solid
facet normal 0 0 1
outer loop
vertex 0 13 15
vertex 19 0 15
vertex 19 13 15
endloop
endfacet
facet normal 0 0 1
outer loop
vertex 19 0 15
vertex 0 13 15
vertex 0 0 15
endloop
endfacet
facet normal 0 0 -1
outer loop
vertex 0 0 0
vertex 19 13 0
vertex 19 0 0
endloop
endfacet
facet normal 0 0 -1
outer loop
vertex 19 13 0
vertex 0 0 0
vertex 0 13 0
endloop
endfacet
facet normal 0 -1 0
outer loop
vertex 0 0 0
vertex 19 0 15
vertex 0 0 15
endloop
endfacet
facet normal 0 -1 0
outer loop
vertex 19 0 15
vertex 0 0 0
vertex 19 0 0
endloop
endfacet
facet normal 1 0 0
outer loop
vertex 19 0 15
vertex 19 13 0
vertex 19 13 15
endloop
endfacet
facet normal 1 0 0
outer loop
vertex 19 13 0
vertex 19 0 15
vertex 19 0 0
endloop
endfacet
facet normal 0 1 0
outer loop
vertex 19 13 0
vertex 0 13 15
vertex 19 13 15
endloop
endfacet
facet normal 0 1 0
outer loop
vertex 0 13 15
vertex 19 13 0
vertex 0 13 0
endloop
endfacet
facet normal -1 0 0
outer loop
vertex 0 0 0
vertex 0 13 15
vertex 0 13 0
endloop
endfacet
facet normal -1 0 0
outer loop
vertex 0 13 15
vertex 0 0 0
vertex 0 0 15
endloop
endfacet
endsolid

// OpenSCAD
// Generated by SolidPython 1.0.1 on 2020-07-29 00:46:56


cube(size = [19, 13, 15]);
/***********************************************
*********      SolidPython code:      **********
************************************************
 
# import packages: SolidPython
from solid import *
from solid.utils import *
from itertools import chain, combinations, permutations


class Resize:

    def __init__(self, scad_file):
        self.scad_file = scad_file
        #self.scad_file = import_scad(scad_file)
        # cone/cylinder param:
        self.r1 = 0
        self.r2 = 0
        self.h = 0
        # rectangular prism param:
        self.w = 0
        self.l = 0
        # ellipse param:
        self.r = 0

    # import OpenScad code (file name corresponds to shape)


    # classify shape + parameters
    def assign(self, param1, param2, param3):
        if self.scad_file == 'cone.scad':
            self.r1 = param1
            self.r2 = param2
            self.h = param3
        elif self.scad_file == 'cylinder.scad':
            self.r1 = param1
            self.r2 = param2
            self.h = param3
        elif self.scad_file == 'rectangularPrism.scad':
            self.h = param1
            self.l = param2
            self.w = param3
        else:
            self.r = param1
            self.h = param2

    # resize parameters
    def iterate(self):
        x = range(3, 20, 2)
        i = 1
        if self.scad_file == 'cone.scad':
            tempList = list(permutations(x, 2))
            for temp in tempList:
                param1 = temp[0]
                param2 = temp[1]
                filepath = 'produced_scad_files/' + 'cone' + str(param1) + '_' + str(param2) + '_' + '.scad'
                scad_render_to_file(cylinder(h=param1, r1=param2, r2=0), filepath)

        elif self.scad_file == 'cylinder.scad':
            tempList = list(permutations(x, 3))
            for temp in tempList:
                param1 = temp[0]
                param2 = temp[1]
                filepath = 'produced_scad_files/' + 'cylinder' + str(param1) + '_' + str(param2) + '_' + '.scad'
                scad_render_to_file(cylinder(h=param1, r1=param2, r2=param2), filepath)

        elif self.scad_file == 'rectangularPrism.scad':
            tempList = list(permutations(x, 3))
            for temp in tempList:
                param1 = temp[0]
                param2 = temp[1]
                param3 = temp[2]
                filepath = 'produced_scad_files/' + 'rectangularPrism' + str(param1) + '_' + str(param2) + '_' + str(
                    param3) + '.scad'
                scad_render_to_file(cube(size=(param1, param2, param3)), filepath)

        elif self.scad_file == 'ellipse.scad':
            tempList = list(permutations(x, 4))
            for temp in tempList:
                param1 = temp[0]
                param2 = temp[1]
                param3 = temp[2]
                param4 = temp[3]
                filepath = 'produced_scad_files/' + 'ellipse' + str(param1) + '_' + str(param2) + '_' + str(param3) + '_' + str(param4) + '.scad'
                scad_render_to_file(scale([param1, param2, param3])(sphere(r=param4)), filepath)

    def render_to_scadfile(self):
        scad_render_to_file(scad, 'example.scad') 
 
************************************************/
